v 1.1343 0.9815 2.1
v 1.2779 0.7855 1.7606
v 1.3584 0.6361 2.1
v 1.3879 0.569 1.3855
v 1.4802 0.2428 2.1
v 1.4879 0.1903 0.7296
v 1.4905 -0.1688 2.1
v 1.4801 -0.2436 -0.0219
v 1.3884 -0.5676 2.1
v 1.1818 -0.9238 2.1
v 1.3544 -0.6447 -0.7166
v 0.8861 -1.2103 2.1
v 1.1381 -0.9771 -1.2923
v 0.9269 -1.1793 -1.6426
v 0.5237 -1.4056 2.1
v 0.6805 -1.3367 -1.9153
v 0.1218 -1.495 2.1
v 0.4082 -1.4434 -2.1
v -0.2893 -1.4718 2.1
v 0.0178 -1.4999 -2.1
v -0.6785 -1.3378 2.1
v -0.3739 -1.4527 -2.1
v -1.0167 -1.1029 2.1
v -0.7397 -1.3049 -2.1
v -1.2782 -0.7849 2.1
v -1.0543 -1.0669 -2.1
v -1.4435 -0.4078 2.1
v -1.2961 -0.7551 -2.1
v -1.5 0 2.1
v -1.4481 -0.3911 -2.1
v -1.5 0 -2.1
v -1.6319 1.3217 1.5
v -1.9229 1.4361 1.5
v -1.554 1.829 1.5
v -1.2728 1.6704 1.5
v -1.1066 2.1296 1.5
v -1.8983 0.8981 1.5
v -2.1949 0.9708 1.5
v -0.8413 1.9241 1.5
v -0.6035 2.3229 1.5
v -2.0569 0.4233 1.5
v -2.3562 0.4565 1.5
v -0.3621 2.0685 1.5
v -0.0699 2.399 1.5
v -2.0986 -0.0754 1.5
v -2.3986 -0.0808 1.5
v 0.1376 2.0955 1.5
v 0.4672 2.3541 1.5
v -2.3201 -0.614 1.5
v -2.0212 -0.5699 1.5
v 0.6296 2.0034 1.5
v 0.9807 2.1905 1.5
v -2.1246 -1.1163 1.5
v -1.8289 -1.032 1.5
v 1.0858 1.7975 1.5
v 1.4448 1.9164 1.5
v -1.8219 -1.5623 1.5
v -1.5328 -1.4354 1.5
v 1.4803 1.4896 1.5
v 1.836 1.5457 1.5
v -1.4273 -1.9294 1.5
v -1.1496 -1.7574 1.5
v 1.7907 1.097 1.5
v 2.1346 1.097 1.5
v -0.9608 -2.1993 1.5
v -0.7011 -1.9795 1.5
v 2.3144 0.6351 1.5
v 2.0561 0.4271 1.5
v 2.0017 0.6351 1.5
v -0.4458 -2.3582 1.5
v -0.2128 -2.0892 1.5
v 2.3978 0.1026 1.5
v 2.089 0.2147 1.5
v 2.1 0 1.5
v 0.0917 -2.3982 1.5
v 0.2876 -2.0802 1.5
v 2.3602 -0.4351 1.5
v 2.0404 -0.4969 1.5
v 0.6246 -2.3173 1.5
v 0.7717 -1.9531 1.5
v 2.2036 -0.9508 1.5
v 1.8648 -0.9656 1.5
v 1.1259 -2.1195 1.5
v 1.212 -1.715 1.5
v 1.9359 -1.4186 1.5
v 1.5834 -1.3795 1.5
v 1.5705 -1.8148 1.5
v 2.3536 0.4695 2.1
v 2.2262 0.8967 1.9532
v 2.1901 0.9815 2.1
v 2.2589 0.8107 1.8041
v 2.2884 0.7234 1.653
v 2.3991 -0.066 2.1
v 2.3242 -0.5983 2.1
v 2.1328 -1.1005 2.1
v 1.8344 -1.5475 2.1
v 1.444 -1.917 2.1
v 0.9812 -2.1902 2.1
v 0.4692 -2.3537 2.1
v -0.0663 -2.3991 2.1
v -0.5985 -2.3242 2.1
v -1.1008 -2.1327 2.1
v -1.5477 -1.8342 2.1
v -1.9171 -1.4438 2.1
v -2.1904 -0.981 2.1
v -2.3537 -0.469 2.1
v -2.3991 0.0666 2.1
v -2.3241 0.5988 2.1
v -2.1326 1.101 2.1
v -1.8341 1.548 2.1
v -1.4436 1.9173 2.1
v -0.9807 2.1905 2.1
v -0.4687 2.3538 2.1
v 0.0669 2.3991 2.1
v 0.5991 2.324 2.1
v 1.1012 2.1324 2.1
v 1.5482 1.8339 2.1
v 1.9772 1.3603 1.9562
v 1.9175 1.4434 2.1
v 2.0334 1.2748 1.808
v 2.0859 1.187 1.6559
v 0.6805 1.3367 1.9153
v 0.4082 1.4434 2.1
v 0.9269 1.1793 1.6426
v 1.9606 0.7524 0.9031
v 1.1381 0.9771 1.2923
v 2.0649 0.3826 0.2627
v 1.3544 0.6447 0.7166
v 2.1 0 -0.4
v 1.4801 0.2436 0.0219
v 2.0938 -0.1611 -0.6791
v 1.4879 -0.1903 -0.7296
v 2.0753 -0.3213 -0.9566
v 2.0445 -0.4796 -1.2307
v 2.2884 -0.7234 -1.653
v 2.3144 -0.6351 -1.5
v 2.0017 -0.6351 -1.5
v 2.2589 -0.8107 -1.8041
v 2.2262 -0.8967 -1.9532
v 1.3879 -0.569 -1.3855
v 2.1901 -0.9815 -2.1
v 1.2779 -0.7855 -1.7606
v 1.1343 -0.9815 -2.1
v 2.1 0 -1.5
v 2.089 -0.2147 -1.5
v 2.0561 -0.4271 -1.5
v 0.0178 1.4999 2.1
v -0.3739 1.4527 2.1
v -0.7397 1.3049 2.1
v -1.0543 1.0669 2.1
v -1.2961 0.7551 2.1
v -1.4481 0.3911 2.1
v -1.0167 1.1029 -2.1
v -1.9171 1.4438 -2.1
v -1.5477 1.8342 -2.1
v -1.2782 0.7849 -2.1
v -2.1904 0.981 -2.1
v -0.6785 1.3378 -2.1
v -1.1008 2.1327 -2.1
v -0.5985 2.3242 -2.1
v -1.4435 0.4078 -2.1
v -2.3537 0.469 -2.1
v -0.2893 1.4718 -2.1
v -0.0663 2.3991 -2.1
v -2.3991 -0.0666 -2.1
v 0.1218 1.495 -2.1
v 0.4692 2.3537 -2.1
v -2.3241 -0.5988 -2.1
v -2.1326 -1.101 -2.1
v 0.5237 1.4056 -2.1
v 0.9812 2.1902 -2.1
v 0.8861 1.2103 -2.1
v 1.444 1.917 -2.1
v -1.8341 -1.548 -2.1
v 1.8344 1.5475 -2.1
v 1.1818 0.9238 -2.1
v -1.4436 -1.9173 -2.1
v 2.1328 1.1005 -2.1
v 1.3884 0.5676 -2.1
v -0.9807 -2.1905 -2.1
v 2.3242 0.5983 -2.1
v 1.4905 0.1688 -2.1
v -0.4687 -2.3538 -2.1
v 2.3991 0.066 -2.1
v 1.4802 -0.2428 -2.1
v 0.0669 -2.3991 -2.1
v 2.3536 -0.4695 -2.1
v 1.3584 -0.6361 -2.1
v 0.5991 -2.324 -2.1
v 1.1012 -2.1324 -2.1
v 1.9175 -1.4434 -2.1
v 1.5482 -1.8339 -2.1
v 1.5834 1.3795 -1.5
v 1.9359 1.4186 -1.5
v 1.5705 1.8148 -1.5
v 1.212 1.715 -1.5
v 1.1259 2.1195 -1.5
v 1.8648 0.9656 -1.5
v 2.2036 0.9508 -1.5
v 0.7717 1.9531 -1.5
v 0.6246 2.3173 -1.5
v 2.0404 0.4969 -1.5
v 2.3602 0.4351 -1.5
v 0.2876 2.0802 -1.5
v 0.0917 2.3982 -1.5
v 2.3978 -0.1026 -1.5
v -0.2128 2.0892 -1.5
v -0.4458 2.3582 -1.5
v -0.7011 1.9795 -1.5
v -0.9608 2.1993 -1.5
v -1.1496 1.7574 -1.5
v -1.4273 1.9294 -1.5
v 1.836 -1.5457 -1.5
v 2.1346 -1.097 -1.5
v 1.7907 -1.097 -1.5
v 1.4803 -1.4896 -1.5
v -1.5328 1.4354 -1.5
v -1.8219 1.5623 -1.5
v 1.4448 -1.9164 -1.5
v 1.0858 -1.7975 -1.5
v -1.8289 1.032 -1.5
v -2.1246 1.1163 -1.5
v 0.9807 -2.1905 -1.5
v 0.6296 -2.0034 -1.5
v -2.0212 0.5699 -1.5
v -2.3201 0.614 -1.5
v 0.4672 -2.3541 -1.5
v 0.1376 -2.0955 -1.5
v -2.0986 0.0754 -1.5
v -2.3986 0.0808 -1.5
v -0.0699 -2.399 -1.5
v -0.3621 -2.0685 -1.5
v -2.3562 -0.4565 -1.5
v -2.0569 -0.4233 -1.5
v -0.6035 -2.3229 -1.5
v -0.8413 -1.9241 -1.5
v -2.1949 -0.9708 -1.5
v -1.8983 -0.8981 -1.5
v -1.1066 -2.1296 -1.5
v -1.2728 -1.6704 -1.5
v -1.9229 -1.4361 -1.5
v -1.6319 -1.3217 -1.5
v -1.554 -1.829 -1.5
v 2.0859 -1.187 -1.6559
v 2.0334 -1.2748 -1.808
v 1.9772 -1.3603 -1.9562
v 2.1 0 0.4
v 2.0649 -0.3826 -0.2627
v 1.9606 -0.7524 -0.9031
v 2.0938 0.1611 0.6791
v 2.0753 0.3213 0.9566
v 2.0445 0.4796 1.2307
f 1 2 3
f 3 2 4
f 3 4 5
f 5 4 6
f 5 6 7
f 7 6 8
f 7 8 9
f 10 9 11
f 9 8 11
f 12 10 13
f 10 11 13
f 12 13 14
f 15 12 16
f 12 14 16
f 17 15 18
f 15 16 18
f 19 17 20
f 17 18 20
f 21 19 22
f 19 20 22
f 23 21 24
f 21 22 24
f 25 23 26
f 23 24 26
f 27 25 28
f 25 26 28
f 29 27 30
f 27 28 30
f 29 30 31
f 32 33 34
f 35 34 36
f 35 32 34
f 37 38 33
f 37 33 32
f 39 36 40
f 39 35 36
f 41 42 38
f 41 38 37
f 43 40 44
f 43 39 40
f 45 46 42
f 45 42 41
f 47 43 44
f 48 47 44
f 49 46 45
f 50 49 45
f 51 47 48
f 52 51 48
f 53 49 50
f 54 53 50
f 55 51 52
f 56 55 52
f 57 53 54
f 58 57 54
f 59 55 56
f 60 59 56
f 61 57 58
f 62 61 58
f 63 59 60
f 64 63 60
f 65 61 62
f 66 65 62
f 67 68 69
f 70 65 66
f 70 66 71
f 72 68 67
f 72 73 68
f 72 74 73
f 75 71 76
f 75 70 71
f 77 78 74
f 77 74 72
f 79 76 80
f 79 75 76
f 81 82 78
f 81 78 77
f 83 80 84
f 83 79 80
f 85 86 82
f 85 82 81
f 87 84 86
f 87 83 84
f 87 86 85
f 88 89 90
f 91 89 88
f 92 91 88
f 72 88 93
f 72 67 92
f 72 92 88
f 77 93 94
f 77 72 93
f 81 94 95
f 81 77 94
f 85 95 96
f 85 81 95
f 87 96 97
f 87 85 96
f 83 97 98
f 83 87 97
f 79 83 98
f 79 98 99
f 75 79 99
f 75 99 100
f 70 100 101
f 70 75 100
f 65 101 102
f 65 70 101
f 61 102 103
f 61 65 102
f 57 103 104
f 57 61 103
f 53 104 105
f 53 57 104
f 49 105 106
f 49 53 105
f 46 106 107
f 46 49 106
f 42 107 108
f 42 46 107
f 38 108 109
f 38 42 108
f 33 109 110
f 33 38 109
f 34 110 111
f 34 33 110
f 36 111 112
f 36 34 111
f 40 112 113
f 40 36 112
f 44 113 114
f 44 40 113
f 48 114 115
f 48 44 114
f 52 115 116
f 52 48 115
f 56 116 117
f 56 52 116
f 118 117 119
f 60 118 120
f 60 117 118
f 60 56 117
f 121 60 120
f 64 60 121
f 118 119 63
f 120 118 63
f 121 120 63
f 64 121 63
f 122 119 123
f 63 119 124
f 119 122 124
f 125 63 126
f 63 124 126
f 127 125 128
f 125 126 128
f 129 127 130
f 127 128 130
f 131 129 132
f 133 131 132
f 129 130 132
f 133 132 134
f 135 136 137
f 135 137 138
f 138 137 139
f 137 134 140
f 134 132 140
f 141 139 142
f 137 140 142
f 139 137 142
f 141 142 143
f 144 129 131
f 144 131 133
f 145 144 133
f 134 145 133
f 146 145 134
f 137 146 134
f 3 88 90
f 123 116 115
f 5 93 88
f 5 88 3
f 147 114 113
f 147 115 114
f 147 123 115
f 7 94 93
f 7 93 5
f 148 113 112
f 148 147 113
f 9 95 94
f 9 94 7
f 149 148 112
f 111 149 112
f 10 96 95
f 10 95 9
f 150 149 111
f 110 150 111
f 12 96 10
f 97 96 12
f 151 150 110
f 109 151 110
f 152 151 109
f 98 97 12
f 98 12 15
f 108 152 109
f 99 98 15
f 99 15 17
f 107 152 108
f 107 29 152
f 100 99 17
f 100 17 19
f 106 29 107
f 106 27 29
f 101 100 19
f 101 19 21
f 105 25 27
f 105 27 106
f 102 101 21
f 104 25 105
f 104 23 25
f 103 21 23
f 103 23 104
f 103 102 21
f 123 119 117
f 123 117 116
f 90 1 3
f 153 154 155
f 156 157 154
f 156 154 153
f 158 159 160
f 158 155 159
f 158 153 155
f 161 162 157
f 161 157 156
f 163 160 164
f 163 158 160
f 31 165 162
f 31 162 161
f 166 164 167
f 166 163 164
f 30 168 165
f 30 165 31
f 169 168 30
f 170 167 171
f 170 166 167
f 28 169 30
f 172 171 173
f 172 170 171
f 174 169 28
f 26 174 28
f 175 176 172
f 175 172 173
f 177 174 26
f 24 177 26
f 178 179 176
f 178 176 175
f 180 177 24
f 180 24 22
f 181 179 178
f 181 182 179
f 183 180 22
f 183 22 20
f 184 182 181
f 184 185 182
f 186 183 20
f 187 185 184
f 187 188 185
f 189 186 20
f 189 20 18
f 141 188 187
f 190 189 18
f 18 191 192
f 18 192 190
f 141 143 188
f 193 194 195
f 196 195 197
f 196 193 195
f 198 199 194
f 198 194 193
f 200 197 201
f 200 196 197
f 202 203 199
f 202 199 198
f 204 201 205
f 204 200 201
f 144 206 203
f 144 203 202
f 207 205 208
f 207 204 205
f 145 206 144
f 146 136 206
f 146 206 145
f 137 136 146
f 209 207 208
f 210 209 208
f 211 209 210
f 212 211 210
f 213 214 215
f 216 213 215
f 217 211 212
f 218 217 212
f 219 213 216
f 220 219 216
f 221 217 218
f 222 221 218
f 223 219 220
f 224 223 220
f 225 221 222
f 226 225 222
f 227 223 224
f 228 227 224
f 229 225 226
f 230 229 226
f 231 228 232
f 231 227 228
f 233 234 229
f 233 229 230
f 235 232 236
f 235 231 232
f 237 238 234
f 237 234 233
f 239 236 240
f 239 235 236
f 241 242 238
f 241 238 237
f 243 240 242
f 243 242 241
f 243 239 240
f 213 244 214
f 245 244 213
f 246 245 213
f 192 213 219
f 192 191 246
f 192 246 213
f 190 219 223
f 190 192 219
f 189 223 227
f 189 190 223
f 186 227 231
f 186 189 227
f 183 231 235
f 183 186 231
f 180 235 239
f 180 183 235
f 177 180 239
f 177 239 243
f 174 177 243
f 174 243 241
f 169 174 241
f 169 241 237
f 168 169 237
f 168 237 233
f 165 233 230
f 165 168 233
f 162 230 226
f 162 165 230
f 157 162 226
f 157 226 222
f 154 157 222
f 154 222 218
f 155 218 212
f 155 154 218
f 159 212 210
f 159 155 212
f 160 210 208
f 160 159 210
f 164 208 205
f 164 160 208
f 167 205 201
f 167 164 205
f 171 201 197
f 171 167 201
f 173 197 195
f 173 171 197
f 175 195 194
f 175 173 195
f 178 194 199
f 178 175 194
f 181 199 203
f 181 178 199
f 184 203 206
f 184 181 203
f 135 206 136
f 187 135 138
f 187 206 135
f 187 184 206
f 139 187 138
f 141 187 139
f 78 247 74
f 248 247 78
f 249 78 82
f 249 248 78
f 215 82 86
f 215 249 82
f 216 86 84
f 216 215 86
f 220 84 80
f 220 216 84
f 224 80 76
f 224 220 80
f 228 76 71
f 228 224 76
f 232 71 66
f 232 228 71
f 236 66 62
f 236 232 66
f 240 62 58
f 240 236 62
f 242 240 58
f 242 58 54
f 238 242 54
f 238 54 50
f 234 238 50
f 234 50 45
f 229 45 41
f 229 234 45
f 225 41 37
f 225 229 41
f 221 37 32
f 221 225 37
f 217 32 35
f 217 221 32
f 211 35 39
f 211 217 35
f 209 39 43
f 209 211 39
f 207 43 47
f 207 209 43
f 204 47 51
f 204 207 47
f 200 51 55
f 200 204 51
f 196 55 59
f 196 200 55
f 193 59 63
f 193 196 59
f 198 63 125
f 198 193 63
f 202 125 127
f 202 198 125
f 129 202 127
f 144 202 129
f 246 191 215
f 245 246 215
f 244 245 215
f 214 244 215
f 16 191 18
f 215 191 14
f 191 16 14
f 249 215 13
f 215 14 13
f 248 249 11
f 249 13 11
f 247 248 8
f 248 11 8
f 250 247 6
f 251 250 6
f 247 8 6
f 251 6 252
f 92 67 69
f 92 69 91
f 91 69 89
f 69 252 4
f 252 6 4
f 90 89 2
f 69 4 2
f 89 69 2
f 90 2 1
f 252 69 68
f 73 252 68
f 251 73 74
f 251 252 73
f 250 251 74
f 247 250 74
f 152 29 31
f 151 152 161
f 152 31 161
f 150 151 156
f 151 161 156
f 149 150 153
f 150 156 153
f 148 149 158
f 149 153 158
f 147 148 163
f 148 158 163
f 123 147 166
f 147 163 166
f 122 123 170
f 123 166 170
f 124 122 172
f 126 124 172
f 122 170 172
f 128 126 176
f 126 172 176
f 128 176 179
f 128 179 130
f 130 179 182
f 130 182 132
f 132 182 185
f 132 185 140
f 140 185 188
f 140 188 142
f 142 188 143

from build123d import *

# Parameters (mm, degrees)
F_3_0MM_DOWEL_HOLE1_D = 3
CUT_EXTRUDE1_DEPTH    = 4.991240409


with BuildPart() as part:
    # Sketch1 → Revolve1 (revolve)
    with BuildSketch(Plane(origin=(0, 0, 0), x_dir=(0, 0, -1), z_dir=(1, 0, 0)), mode=Mode.PRIVATE) as revolve1_sk:
        Polygon((-1.5, 2.4), (-1.5, 2.1), (1.5, 2.1), (1.5, 2.4), (2.1, 2.4), (2.1, 0), (-2.1, 0), (-2.1, 2.4), align=None)
    revolve(revolve1_sk.sketch.rotate(Axis((0, 0, 2.1), (0, 0, -1)), 90), axis=Axis((0, 0, 2.1), (0, 0, -1)))

    # Ø3.0mm Dowel Hole1 (through all)
    with Locations(Plane.XY.offset(2.1)):
        with Locations((0, 0)):
            Hole(F_3_0MM_DOWEL_HOLE1_D / 2)

    # Sketch4 → Cut-Extrude1 (cut, through all)
    with BuildSketch(Plane(origin=(0, 0, 0), x_dir=(0, 0, -1), z_dir=(1, 0, 0))):
        Polygon((-2.3, 1.096965511), (-2.1, 1.443375673), (2.3, -1.096965511), (2.1, -1.443375673), align=None)
    extrude(amount=CUT_EXTRUDE1_DEPTH, mode=Mode.SUBTRACT)


solid = part.part
